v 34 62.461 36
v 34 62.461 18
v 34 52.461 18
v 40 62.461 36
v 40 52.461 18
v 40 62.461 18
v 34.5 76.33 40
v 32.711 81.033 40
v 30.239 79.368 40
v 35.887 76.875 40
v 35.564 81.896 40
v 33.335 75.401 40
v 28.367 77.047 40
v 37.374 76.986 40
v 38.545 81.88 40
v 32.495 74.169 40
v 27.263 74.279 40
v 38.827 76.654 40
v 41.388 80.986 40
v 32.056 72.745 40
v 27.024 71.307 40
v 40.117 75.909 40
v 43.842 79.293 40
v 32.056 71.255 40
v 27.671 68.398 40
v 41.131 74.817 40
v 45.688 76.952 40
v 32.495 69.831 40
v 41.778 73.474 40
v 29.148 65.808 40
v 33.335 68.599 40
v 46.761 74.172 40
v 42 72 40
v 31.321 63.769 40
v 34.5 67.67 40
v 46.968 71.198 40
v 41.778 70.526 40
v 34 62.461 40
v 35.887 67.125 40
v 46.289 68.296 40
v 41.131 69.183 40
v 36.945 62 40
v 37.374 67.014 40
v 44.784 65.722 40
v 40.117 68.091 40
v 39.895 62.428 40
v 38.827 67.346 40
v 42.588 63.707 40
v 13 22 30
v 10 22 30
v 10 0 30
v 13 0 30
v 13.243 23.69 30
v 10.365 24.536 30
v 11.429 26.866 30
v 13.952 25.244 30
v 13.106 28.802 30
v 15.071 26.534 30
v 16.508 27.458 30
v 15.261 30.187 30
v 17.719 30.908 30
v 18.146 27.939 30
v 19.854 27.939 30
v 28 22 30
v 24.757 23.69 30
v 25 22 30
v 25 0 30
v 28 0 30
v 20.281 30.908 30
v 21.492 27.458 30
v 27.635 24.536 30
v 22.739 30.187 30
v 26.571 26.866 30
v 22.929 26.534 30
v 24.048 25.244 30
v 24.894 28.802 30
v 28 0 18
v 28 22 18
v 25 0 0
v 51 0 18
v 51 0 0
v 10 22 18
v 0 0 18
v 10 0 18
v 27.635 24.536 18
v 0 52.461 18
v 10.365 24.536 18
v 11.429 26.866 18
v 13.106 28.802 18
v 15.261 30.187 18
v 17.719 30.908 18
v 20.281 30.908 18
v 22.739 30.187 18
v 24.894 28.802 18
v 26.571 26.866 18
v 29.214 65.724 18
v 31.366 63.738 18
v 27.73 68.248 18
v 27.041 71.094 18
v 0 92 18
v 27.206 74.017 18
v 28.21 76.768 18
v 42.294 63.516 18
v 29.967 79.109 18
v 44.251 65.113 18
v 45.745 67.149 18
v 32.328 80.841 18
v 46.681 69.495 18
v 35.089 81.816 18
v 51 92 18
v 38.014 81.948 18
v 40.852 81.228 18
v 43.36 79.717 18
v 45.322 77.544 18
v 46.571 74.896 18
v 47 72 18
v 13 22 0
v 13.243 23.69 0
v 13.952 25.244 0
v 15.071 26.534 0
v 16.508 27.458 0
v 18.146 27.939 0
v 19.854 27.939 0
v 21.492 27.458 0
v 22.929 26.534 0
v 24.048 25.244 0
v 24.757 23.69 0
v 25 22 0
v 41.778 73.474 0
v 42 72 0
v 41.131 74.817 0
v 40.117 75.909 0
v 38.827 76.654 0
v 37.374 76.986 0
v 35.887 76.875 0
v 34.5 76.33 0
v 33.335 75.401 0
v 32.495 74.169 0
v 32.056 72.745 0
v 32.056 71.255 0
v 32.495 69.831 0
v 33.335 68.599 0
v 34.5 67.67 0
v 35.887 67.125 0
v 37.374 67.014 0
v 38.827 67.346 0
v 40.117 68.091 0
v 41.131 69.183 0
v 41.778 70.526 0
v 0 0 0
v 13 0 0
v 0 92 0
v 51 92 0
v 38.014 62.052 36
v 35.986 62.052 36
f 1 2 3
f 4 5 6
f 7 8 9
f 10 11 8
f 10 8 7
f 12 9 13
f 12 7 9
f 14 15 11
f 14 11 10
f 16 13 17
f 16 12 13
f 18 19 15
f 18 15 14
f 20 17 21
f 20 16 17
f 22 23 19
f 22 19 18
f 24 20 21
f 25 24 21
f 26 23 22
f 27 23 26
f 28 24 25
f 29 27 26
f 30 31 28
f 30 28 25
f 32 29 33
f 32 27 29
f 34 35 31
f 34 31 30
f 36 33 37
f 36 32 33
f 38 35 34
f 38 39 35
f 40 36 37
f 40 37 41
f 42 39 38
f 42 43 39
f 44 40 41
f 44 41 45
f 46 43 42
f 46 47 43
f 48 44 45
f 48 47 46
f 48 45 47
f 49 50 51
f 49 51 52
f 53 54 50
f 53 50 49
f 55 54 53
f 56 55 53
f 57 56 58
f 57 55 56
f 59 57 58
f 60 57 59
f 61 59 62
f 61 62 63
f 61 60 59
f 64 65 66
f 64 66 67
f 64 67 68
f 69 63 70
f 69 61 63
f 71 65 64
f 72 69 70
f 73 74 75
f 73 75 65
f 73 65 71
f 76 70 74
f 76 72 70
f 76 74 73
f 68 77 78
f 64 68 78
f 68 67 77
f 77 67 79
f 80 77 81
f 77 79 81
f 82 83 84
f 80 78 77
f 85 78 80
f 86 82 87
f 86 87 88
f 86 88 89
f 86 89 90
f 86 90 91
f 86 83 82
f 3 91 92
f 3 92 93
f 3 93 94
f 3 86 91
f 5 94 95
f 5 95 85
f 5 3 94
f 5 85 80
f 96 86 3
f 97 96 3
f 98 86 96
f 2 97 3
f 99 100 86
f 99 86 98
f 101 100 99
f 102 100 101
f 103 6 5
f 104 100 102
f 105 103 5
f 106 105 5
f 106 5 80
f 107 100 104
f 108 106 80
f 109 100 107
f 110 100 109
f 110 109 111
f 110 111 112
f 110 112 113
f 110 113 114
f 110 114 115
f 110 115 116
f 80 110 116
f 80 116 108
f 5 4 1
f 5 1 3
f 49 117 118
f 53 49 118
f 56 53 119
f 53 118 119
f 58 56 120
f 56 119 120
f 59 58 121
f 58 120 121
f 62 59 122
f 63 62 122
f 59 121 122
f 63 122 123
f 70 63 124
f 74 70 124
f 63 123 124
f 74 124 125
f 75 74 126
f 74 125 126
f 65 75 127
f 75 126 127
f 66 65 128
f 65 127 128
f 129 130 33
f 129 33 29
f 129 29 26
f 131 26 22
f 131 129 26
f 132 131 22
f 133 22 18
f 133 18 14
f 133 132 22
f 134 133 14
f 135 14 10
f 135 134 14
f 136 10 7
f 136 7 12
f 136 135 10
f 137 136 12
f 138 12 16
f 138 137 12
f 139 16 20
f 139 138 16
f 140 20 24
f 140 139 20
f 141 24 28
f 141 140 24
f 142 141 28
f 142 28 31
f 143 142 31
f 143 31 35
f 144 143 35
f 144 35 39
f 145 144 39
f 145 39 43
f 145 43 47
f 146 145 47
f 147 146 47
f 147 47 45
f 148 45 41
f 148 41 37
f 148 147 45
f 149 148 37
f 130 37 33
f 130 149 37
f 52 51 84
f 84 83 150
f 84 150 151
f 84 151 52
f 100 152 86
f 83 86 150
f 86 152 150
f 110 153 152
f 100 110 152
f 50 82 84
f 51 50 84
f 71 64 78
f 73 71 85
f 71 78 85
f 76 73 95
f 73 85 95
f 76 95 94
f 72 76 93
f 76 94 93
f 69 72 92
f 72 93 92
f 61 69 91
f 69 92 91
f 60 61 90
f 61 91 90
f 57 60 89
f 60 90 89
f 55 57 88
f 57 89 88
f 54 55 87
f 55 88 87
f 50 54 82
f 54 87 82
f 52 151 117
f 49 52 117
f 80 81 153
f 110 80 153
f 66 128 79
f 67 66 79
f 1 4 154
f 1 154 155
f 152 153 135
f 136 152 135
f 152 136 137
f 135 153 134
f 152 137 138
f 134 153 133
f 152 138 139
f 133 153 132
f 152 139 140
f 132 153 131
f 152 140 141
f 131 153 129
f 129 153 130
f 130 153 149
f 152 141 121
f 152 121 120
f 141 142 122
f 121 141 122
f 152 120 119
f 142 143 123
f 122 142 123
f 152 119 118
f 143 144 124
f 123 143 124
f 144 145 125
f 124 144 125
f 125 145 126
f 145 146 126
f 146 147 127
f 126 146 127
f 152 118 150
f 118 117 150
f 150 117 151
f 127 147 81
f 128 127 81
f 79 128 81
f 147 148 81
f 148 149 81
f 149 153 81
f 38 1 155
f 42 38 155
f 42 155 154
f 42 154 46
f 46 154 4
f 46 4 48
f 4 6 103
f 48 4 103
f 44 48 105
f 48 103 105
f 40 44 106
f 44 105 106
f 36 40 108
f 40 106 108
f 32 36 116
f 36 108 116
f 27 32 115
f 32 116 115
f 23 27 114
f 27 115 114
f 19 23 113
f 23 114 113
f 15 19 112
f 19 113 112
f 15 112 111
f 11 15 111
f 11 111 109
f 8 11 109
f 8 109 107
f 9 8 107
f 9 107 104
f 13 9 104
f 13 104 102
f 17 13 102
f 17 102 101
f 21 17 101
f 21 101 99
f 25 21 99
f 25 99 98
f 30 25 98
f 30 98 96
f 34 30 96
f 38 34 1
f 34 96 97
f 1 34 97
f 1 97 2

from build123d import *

# Parameters (mm, degrees)
EXTRUDE_2_DEPTH     = 18
EXTRUDE_3_DEPTH     = 30
SKETCH_1_8_R        = 5
EXTRUDE_4_DEPTH     = 40
EXTRUDE_5_DEPTH     = 36
CUT_EXTRUDE_1_DEPTH = 109


with BuildPart() as part:
    # Эскиз1 → Бобышка-Вытянуть2 (new body)
    with BuildSketch(Plane.XY):
        with BuildLine():
            Line((0, 92), (0, 0))
            Line((0, 0), (10, 0))
            Line((10, 0), (10, 22))
            ThreePointArc((10, 22), (19, 31), (28, 22))
            Line((28, 22), (28, 0))
            Line((28, 0), (51, 0))
            Line((51, 0), (51, 92))
            Line((51, 92), (0, 92))
        make_face()
        with BuildLine():
            Line((40, 52.460607986), (34, 52.460607986))
            Line((34, 52.460607986), (34, 62.460607986))
            ThreePointArc((34, 62.460607986), (31.083920217, 80.062257748), (47, 72))
            ThreePointArc((47, 72), (45.062257748, 66.083920217), (40, 62.460607986))
            Line((40, 62.460607986), (40, 52.460607986))
        make_face(mode=Mode.SUBTRACT)
    extrude(amount=EXTRUDE_2_DEPTH)

    # Эскиз1<6> → Бобышка-Вытянуть3 (add)
    with BuildSketch(Plane.XY):
        with BuildLine():
            Line((10, 22), (10, 0))
            Line((10, 0), (13, 0))
            Line((13, 0), (13, 22))
            ThreePointArc((13, 22), (19, 28), (25, 22))
            Line((25, 22), (25, 0))
            Line((25, 0), (28, 0))
            Line((28, 0), (28, 22))
            ThreePointArc((28, 22), (19, 31), (10, 22))
        make_face()
    extrude(amount=EXTRUDE_3_DEPTH)

    # Эскиз1<8> → Бобышка-Вытянуть4 (add)
    with BuildSketch(Plane.XY):
        with BuildLine():
            ThreePointArc((47, 72), (31.083920217, 80.062257748), (34, 62.460607986))
            ThreePointArc((34, 62.460607986), (37, 62), (40, 62.460607986))
            ThreePointArc((40, 62.460607986), (45.062257748, 66.083920217), (47, 72))
        make_face()
        with Locations((37, 72)):
            Circle(SKETCH_1_8_R, mode=Mode.SUBTRACT)
    extrude(amount=EXTRUDE_4_DEPTH)

    # Эскиз1<9> → Бобышка-Вытянуть5 (add)
    with BuildSketch(Plane.XY):
        with BuildLine():
            Line((34, 62.460607986), (34, 52.460607986))
            Line((34, 52.460607986), (40, 52.460607986))
            Line((40, 52.460607986), (40, 62.460607986))
            ThreePointArc((40, 62.460607986), (37, 62), (34, 62.460607986))
        make_face()
    extrude(amount=EXTRUDE_5_DEPTH)

    # Эскиз3 → Вырез-Вытянуть1 (cut, through all)
    with BuildSketch(Plane(origin=(40, 0, 0), x_dir=(0, 0, -1), z_dir=(1, 0, 0))):
        Polygon((-36, 62.460607986), (-18, 52.460607986), (-36, 52.460607986), align=None)
    extrude(amount=-CUT_EXTRUDE_1_DEPTH, mode=Mode.SUBTRACT)


solid = part.part
